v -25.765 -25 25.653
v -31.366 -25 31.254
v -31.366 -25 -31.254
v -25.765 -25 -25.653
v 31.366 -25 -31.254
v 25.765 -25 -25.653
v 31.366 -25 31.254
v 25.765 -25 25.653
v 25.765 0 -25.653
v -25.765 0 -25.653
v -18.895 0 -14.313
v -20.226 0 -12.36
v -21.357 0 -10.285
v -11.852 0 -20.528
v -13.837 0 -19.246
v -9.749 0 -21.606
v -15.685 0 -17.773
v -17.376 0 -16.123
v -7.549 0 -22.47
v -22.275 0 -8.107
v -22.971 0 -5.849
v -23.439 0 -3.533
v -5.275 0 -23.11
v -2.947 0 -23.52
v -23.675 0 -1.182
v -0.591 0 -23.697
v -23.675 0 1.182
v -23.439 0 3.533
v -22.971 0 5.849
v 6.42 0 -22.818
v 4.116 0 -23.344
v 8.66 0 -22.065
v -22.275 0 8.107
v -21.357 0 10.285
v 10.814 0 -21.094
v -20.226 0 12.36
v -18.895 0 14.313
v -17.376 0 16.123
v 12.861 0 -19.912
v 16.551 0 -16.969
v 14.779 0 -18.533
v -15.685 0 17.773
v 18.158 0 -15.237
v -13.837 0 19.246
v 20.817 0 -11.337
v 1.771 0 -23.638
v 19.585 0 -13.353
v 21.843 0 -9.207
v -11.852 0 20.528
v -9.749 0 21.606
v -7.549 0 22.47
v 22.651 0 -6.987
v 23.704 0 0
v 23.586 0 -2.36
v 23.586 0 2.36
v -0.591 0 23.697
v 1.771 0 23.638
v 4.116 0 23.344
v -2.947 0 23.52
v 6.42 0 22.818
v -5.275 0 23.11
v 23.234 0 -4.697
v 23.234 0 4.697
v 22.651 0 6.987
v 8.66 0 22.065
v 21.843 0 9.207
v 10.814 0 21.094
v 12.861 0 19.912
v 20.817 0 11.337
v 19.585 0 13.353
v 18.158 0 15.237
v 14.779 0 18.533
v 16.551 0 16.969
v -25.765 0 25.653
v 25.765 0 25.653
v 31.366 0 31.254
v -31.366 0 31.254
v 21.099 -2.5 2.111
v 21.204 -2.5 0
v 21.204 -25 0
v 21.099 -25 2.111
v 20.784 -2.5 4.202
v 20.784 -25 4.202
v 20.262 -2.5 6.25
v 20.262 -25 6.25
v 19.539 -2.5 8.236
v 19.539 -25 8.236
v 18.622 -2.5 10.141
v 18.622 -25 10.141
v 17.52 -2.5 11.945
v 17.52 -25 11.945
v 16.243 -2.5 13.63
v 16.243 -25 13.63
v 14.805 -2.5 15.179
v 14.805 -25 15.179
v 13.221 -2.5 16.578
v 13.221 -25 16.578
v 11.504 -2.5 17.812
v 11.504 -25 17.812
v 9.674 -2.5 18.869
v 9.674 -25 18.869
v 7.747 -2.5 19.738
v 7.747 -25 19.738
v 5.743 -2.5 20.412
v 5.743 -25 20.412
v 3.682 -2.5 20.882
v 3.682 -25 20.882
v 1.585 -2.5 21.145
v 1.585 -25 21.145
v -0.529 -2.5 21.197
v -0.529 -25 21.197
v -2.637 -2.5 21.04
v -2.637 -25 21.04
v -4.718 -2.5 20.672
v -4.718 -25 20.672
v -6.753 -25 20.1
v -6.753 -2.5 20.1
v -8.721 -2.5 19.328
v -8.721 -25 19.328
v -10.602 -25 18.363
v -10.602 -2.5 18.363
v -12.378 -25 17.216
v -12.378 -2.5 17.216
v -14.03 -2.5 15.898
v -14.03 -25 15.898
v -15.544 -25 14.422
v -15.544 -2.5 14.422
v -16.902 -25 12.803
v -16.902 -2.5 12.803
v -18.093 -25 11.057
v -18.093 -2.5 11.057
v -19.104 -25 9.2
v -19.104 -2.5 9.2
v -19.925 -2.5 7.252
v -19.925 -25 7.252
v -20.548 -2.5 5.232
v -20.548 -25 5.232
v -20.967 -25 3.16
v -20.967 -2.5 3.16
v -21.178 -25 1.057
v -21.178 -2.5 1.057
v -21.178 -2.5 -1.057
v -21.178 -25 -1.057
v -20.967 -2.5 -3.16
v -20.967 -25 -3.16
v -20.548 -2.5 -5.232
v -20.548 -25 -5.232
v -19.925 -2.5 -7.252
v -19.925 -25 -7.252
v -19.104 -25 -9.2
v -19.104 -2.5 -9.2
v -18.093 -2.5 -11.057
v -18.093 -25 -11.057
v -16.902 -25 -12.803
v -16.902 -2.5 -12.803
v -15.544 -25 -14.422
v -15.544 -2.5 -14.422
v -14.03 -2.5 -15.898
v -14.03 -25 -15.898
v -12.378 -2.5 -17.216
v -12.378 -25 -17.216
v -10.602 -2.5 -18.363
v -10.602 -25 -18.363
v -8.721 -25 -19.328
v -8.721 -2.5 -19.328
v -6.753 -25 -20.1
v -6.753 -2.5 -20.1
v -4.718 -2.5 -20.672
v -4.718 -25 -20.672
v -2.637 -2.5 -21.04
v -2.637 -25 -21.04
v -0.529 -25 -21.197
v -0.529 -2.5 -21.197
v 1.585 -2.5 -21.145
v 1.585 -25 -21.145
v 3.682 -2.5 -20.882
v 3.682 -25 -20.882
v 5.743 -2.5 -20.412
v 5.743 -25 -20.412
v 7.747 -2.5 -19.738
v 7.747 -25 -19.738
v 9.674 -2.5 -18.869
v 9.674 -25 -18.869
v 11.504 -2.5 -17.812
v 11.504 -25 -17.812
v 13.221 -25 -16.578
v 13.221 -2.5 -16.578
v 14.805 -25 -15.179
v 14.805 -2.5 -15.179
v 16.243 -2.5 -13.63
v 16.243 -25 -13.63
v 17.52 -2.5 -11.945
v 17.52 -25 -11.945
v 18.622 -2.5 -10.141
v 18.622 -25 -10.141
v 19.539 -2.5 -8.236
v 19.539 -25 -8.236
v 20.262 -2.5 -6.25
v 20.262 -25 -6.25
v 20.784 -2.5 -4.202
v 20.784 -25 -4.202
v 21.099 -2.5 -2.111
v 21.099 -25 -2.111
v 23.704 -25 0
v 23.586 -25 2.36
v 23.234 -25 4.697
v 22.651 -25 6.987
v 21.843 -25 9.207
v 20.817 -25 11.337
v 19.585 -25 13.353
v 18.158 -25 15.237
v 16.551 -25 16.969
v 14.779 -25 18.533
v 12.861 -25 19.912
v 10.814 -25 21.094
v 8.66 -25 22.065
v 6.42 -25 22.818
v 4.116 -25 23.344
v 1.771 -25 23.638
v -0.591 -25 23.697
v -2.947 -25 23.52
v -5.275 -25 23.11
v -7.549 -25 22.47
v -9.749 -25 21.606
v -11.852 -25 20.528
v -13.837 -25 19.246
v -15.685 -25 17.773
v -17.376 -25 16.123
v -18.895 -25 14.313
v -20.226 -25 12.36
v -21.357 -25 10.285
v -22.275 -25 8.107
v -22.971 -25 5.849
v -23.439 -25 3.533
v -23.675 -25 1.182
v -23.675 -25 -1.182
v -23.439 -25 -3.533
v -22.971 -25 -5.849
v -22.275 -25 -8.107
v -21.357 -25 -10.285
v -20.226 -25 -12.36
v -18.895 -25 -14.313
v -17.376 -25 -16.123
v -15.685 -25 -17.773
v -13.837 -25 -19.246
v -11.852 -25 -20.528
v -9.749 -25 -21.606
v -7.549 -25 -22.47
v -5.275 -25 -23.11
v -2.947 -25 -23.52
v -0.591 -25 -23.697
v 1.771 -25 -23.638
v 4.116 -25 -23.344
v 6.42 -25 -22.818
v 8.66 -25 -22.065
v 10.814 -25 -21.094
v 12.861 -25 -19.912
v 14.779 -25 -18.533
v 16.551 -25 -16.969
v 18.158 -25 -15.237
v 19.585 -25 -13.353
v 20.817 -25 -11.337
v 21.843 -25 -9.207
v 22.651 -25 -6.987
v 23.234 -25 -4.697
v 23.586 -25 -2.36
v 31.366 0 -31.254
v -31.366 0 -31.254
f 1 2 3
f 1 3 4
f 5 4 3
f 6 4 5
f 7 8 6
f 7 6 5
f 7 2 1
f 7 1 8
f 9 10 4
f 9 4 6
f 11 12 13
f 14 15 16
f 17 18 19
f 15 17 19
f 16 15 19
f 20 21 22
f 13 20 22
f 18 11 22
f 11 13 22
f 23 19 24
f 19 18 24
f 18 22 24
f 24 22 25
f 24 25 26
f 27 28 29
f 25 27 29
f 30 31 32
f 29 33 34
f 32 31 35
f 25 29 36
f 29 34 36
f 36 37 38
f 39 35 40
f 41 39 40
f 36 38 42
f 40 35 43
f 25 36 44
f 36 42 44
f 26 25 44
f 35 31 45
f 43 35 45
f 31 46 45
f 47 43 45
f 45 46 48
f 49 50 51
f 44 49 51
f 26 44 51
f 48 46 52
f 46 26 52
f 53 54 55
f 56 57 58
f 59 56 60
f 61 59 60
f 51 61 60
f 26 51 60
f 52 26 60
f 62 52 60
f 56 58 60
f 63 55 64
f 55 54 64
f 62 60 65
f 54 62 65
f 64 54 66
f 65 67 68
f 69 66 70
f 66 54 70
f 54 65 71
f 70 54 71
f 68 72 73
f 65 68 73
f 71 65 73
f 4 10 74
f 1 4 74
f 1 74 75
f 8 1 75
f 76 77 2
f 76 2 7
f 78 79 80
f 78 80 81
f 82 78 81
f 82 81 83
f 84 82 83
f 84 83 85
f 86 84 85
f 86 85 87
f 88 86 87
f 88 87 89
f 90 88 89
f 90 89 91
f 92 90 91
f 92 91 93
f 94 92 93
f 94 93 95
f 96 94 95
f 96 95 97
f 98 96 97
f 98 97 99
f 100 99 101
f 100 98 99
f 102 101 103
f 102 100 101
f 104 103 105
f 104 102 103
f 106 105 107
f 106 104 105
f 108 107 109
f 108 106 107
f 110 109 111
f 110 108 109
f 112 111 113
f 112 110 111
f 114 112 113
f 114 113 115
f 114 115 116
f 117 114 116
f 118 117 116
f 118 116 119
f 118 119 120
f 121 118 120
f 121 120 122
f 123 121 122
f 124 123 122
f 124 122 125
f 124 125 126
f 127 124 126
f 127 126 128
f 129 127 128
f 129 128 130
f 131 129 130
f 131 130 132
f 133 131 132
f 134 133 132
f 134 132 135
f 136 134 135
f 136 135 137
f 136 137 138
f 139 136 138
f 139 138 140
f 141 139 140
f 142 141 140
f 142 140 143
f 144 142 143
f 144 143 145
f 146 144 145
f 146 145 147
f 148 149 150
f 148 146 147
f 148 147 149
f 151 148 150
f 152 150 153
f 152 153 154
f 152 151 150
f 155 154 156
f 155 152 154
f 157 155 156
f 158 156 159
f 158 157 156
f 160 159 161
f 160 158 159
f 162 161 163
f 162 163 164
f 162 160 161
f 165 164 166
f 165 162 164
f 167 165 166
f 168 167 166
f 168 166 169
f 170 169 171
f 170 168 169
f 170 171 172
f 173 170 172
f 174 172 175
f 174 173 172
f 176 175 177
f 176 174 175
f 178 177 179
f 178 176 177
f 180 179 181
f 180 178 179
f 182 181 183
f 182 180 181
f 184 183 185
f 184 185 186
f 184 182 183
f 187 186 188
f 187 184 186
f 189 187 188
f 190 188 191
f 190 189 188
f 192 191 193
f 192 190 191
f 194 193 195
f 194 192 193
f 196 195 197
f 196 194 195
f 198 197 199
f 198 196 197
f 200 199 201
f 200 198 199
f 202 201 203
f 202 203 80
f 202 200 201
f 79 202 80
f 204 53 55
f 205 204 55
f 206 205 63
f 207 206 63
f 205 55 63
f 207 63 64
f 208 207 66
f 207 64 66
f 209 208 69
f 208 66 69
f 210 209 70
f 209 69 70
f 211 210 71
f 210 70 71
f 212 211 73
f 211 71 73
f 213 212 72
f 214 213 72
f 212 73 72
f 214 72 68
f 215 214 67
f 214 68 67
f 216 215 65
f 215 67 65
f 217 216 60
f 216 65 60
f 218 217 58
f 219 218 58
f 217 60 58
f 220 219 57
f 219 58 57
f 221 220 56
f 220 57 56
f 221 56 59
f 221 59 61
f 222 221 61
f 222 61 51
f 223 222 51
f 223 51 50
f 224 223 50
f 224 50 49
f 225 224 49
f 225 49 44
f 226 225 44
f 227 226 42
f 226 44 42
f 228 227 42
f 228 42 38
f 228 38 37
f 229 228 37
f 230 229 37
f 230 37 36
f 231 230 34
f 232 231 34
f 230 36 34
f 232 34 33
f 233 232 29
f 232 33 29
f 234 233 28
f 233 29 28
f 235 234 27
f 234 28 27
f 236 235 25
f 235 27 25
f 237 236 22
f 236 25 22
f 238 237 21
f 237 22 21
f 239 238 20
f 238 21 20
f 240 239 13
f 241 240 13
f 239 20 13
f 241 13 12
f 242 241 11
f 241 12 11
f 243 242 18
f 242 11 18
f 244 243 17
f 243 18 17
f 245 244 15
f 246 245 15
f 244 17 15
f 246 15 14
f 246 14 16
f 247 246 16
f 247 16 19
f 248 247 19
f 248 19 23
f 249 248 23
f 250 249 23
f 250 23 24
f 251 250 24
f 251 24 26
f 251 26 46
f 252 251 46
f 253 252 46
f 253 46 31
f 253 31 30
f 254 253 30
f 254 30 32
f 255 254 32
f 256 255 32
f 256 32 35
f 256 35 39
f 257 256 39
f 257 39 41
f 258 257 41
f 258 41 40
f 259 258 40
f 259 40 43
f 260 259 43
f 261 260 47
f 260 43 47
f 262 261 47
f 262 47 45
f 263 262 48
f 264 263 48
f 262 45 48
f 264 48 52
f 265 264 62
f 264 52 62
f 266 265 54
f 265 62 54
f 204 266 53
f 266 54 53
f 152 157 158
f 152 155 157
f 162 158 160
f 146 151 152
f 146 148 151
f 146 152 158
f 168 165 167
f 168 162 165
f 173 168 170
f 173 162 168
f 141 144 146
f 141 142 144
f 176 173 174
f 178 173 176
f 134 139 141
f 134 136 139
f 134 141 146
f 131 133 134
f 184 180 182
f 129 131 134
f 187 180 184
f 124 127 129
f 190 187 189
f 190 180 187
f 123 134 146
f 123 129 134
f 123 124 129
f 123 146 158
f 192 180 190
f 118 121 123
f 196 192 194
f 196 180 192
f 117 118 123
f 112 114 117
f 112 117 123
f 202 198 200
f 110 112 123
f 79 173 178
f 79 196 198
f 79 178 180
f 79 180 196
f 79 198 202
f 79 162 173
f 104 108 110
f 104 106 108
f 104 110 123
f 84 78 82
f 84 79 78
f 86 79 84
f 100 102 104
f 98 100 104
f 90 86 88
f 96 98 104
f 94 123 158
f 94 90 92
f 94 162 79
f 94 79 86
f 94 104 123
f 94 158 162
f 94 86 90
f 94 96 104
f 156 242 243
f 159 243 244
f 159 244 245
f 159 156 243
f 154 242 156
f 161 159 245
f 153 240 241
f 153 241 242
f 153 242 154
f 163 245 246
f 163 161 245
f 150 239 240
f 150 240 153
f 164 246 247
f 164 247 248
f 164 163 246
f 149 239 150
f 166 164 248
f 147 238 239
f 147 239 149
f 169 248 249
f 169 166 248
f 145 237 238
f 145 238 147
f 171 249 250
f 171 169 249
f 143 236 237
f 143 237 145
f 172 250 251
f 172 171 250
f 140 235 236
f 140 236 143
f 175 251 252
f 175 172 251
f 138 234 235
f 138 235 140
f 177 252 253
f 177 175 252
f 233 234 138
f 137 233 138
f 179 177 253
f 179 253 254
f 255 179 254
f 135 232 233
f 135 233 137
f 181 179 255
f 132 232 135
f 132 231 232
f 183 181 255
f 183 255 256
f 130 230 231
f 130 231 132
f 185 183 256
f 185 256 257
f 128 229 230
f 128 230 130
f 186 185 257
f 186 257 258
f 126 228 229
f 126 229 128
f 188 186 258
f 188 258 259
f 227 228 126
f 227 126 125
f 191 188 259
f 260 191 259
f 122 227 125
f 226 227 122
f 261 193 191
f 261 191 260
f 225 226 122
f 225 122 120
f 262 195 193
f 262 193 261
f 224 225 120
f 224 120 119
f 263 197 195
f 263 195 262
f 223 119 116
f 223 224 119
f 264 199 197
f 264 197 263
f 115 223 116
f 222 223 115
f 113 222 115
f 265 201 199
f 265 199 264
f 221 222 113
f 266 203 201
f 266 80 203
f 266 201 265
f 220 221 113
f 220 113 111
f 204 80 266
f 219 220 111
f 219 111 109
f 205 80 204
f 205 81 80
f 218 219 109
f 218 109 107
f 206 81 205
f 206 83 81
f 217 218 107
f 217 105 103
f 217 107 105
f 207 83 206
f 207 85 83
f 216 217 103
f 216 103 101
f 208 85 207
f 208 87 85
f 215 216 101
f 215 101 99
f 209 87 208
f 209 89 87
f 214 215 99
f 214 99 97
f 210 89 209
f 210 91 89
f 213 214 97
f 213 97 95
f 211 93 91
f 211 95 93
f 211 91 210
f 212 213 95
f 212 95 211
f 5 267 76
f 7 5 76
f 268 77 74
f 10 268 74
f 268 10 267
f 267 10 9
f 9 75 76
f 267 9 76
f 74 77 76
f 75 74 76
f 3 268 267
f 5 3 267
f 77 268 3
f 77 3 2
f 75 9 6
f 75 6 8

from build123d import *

# Parameters (mm, degrees)
F0_W     = 62.7311617136
F0_H     = 62.5071153045
F0_W_2   = 51.5291690826
F0_H_2   = 51.3051226735
F1_DEPTH = 25
F0_R     = 23.7040610585
F2_T     = -2.5


with BuildPart() as f1:
    # F0 (on Front) → F1 (new body)
    with BuildSketch(Plane.XZ):
        Rectangle(F0_W, F0_H)
        Rectangle(F0_W_2, F0_H_2, mode=Mode.SUBTRACT)
    extrude(amount=F1_DEPTH)


with BuildPart() as f1b:
    # F0 (on Front) → F1, piece 2 (new body)
    with BuildSketch(Plane.XZ):
        Circle(F0_R)
    extrude(amount=F1_DEPTH)

    # F2
    f2_openings = [f1b.faces().sort_by_distance(p)[0] for p in [
        (0, -25, 0),
    ]]
    offset(amount=F2_T, openings=f2_openings)


solid = Compound([f1.part, f1b.part])
